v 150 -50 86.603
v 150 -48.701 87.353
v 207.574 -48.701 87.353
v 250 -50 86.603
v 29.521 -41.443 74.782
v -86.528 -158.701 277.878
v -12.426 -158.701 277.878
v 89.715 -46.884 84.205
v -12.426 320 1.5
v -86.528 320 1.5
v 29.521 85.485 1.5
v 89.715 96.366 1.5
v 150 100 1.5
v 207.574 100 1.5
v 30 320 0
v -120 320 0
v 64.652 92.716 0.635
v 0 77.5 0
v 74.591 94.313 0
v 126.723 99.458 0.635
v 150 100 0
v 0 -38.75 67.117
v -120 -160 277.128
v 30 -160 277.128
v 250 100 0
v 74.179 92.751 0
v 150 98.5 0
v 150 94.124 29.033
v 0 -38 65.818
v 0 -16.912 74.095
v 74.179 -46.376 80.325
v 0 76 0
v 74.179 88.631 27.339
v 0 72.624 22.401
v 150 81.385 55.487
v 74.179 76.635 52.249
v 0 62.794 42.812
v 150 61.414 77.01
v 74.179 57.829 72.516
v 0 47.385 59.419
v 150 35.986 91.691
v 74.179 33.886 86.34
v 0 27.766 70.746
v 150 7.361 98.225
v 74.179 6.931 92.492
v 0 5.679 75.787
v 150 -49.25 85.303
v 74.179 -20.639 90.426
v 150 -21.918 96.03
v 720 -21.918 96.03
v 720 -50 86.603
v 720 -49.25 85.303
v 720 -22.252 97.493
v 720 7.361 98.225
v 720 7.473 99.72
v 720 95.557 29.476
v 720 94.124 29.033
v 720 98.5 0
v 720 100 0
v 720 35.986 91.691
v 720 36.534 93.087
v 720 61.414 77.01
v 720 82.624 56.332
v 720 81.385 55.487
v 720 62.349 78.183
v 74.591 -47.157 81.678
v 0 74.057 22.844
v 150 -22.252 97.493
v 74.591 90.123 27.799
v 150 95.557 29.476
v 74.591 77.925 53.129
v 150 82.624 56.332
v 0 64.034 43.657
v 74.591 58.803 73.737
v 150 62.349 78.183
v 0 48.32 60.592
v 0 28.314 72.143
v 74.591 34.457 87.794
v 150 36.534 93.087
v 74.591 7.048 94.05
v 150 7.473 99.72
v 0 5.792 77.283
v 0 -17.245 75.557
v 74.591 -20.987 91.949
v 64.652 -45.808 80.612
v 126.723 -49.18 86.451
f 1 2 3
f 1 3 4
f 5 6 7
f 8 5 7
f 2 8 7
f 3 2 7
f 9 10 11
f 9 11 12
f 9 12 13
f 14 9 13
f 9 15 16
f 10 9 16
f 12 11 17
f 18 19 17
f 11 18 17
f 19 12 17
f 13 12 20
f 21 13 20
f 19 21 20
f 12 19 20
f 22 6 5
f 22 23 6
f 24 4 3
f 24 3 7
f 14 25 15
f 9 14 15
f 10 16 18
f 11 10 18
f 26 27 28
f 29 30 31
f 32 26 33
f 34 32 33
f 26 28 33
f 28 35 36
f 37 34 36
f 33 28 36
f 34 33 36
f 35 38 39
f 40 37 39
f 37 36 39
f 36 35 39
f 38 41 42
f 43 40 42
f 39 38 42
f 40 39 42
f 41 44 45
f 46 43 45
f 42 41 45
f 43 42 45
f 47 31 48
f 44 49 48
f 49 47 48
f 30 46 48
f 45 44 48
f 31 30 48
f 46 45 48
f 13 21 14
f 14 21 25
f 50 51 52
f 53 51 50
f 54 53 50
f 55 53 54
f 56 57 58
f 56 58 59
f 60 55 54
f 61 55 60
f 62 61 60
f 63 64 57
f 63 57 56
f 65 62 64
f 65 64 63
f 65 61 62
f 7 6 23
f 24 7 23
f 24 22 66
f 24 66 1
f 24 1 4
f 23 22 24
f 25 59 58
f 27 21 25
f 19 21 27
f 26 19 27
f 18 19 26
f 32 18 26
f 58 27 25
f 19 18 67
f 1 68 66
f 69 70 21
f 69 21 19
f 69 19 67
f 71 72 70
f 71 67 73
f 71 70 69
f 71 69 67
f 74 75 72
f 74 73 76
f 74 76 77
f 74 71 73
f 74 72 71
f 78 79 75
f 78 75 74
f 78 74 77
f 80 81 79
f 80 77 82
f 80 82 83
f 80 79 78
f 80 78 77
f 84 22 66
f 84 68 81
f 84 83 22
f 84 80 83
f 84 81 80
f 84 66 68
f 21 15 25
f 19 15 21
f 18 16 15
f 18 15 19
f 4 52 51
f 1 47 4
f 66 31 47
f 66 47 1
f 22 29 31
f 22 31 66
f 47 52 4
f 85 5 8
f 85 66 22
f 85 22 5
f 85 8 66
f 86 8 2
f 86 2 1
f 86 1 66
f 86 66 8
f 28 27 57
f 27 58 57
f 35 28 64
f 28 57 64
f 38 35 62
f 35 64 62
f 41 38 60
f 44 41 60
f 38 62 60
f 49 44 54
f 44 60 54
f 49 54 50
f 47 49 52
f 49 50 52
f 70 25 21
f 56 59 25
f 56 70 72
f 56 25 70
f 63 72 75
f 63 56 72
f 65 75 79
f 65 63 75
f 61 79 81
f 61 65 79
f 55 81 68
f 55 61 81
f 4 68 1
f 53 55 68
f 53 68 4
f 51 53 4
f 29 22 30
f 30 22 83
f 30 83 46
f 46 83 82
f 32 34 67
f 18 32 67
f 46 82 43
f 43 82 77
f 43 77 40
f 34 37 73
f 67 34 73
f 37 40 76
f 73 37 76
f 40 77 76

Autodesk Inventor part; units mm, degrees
ref_plane "YZ Plane" through (0, 0, 0) normal (1, 0, 0) x (0, 1, 0)
ref_plane "XZ Plane" through (0, 0, 0) normal (0, 1, 0) x (-1, 0, 0)
ref_plane "XY Plane" through (0, 0, 0) normal (0, 0, 1) x (1, 0, 0)
sketch "Sketch3" plane through (0, 0, 0) normal (0, 0, 1) x (1, 0, 0)
  spline S0 degree 4 poles (0, 76) (3.2261, 76.9678) (7.7454, 78.2848) (13.5618, 79.9096) (20.6802, 81.7875) (25.8529, 83.0987) (31.0257, 84.3563) (36.1985, 85.5604) (41.3712, 86.7109) (46.544, 87.808) (51.7168, 88.8516) (56.8895, 89.8416) (62.0623, 90.7781) (67.2351, 91.6611) (72.4079, 92.4906) (77.5807, 93.2666) (82.7535, 93.9891) (87.9263, 94.658) (93.0991, 95.2734) (98.2719, 95.8353) (103.4447, 96.3438) (108.6175, 96.7986) (113.7903, 97.2) (118.9631, 97.5479) (124.1359, 97.8422) (129.3087, 98.083) (136.4207, 98.3405) (142.2404, 98.461) (146.767, 98.5) (150, 98.5) knots 0 0 0 0 0 0.087261 0.122096 0.156887 0.191635 0.226341 0.261008 0.295637 0.33023 0.364788 0.399313 0.433807 0.468271 0.502708 0.537118 0.571504 0.605867 0.64021 0.674533 0.708839 0.74313 0.777407 0.811672 0.845927 0.880174 0.914415 1 1 1 1 1
  spline S1 degree 4 poles (0, 77.5) (3.2261, 78.4678) (7.7454, 79.7848) (13.5618, 81.4096) (20.6802, 83.2875) (25.8529, 84.5987) (31.0257, 85.8563) (36.1985, 87.0604) (41.3712, 88.2109) (46.544, 89.308) (51.7168, 90.3516) (56.8895, 91.3416) (62.0623, 92.2781) (67.2351, 93.1611) (72.4079, 93.9906) (77.5807, 94.7666) (82.7535, 95.4891) (87.9263, 96.158) (93.0991, 96.7734) (98.2719, 97.3353) (103.4447, 97.8438) (108.6175, 98.2986) (113.7903, 98.7) (118.9631, 99.0479) (124.1359, 99.3422) (129.3087, 99.583) (136.4207, 99.8405) (142.2404, 99.961) (146.767, 100) (150, 100) knots 0 0 0 0 0 0.087261 0.122096 0.156887 0.191635 0.226341 0.261008 0.295637 0.33023 0.364788 0.399313 0.433807 0.468271 0.502708 0.537118 0.571504 0.605867 0.64021 0.674533 0.708839 0.74313 0.777407 0.811672 0.845927 0.880174 0.914415 1 1 1 1 1
  line L0 (0, 77.5) -> (0, 76)
  line L1 (150, 100) -> (720, 100)
  line L2 (150, 98.5) -> (720, 98.5)
  line L3 (720, 100) -> (720, 98.5)
  line L4 (0, 0) -> (1383.1618, 0) construction
  line L5 (250, 100) -> (30, 320)
  line L6 (30, 320) -> (-120, 320)
  line L7 (-120, 320) -> (0, 77.5)
  point P0 (5.1724, 77.525)
  point P1 (10.3448, 78.9964)
  point P2 (15.5172, 80.4144)
  point P3 (20.6897, 81.7788)
  point P4 (25.8621, 83.0898)
  point P5 (31.0345, 84.3472)
  point P6 (36.2069, 85.5511)
  point P7 (41.3793, 86.7015)
  point P8 (46.5517, 87.7985)
  point P9 (51.7241, 88.8419)
  point P10 (56.8966, 89.8317)
  point P11 (62.069, 90.7681)
  point P12 (67.2414, 91.651)
  point P13 (72.4138, 92.4804)
  point P14 (77.5862, 93.2562)
  point P15 (82.7586, 93.9786)
  point P16 (87.931, 94.6474)
  point P17 (93.1034, 95.2628)
  point P18 (98.2759, 95.8246)
  point P19 (103.4483, 96.3329)
  point P20 (108.6207, 96.7878)
  point P21 (113.7931, 97.1891)
  point P22 (118.9655, 97.5369)
  point P23 (124.1379, 97.8312)
  point P24 (129.3103, 98.0719)
  point P25 (134.4828, 98.2592)
  point P26 (139.6552, 98.393)
  point P27 (144.8276, 98.4732)
  point P28 (5.1724, 79.025)
  point P29 (10.3448, 80.4964)
  point P30 (15.5172, 81.9144)
  point P31 (20.6897, 83.2788)
  point P32 (25.8621, 84.5898)
  point P33 (31.0345, 85.8472)
  point P34 (36.2069, 87.0511)
  point P35 (41.3793, 88.2015)
  point P36 (46.5517, 89.2985)
  point P37 (51.7241, 90.3419)
  point P38 (56.8966, 91.3317)
  point P39 (62.069, 92.2681)
  point P40 (67.2414, 93.151)
  point P41 (72.4138, 93.9804)
  point P42 (77.5862, 94.7562)
  point P43 (82.7586, 95.4786)
  point P44 (87.931, 96.1474)
  point P45 (93.1034, 96.7628)
  point P46 (98.2759, 97.3246)
  point P47 (103.4483, 97.8329)
  point P48 (108.6207, 98.2878)
  point P49 (113.7931, 98.6891)
  point P50 (118.9655, 99.0369)
  point P51 (124.1379, 99.3312)
  point P52 (129.3103, 99.5719)
  point P53 (134.4828, 99.7592)
  point P54 (139.6552, 99.893)
  point P55 (144.8276, 99.9732)
  dimension "d6" = 570
  dimension "d7" = 1.5
  dimension "d8" = 1.5
  dimension "d9" = 100
  dimension "d11" = 45
  dimension "d12" = 220
  dimension "d13" = 250
  dimension "d14" = 150
  dimension "d15" = 77.5
  dimension "d63" = 720
  dimension "d66" = 150
revolve "Revolution1" add sketch "Sketch3" angle 360 about axis through (0, 0, 0) along (1, 0, 0) contours L0 S1 L1 L3 L2 S0
extrude "Extrusion1" add sketch "Sketch3" along normal mid plane 3 contours L7 L6 L5 L1 S1
pattern_circular "Circular Pattern1" count 3 over 360 about axis through (-10, 0, 0) along (-1, 0, 0) of "Extrusion1"
chamfer "Chamfer1" distance 30 distance2 1.5 1 edges at (140, -103.701, 182.6153) measured on face at (-30, -118.2843, 207.8744)
chamfer "Chamfer2" distance 30 distance2 1.5 1 edges at (140, -106.299, 181.1153) measured on face at (-30, -120.8824, 206.3744)
chamfer "Chamfer3" distance 30 distance2 1.5 1 edges at (-60, -98.076, 172.8725) measured on face at (-44.1421, -118.2843, 207.8744)
chamfer "Chamfer5" distance 30 distance2 1.5 1 edges at (-60, 198.75, 1.5) measured on face at (-30, 239.1667, 1.5)
chamfer "Chamfer6" distance 30 distance2 1.5 1 edges at (140, 210, 1.5) measured on face at (-9.0023, 241.8283, 1.5)
chamfer "Chamfer7" distance 30 distance2 1.5 1 edges at (-60, 198.75, -1.5) measured on face at (-30, 239.1667, -1.5)
chamfer "Chamfer8" distance 30 distance2 1.5 1 edges at (140, 210, -1.5) measured on face at (-9.0027, 241.8282, -1.5)
chamfer "Chamfer9" distance 30 distance2 1.5 1 edges at (-60, -98.076, -172.8725) measured on face at (-30, -118.2843, -207.8744)
chamfer "Chamfer10" distance 30 distance2 1.5 1 edges at (140, -103.701, -182.6153) measured on face at (-9.0023, -119.6151, -210.1794)
chamfer "Chamfer11" distance 30 distance2 1.5 1 edges at (140, -106.299, -181.1153) measured on face at (-30, -120.8824, -206.3744)
chamfer "Chamfer12" distance 30 distance2 1.5 1 edges at (-60, -100.674, -171.3725) measured on face at (-44.1419, -120.8824, -206.3744)
chamfer "Chamfer13" distance 30 distance2 1.5 1 edges at (-60, -100.674, 171.3725) measured on face at (-44.1419, -120.8824, 206.3744)
ref_plane "Work Plane1" through (30, 320, 0) normal (0, 0, -1) x (-1, 0, 0)
ref_plane "Work Plane2" through (-120, -160, 277.1281) normal (0, -0.866, -0.5) x (1, 0, 0)
split "Split1" plane through (-120, -160, 277.1281) removes the side toward (0, -0.866, -0.5)
split "Split2" plane through (30, 320, 0) removes the side toward (0, 0, -1)
properties part number "26P0131-04-0005-AY" material "CFRP"
